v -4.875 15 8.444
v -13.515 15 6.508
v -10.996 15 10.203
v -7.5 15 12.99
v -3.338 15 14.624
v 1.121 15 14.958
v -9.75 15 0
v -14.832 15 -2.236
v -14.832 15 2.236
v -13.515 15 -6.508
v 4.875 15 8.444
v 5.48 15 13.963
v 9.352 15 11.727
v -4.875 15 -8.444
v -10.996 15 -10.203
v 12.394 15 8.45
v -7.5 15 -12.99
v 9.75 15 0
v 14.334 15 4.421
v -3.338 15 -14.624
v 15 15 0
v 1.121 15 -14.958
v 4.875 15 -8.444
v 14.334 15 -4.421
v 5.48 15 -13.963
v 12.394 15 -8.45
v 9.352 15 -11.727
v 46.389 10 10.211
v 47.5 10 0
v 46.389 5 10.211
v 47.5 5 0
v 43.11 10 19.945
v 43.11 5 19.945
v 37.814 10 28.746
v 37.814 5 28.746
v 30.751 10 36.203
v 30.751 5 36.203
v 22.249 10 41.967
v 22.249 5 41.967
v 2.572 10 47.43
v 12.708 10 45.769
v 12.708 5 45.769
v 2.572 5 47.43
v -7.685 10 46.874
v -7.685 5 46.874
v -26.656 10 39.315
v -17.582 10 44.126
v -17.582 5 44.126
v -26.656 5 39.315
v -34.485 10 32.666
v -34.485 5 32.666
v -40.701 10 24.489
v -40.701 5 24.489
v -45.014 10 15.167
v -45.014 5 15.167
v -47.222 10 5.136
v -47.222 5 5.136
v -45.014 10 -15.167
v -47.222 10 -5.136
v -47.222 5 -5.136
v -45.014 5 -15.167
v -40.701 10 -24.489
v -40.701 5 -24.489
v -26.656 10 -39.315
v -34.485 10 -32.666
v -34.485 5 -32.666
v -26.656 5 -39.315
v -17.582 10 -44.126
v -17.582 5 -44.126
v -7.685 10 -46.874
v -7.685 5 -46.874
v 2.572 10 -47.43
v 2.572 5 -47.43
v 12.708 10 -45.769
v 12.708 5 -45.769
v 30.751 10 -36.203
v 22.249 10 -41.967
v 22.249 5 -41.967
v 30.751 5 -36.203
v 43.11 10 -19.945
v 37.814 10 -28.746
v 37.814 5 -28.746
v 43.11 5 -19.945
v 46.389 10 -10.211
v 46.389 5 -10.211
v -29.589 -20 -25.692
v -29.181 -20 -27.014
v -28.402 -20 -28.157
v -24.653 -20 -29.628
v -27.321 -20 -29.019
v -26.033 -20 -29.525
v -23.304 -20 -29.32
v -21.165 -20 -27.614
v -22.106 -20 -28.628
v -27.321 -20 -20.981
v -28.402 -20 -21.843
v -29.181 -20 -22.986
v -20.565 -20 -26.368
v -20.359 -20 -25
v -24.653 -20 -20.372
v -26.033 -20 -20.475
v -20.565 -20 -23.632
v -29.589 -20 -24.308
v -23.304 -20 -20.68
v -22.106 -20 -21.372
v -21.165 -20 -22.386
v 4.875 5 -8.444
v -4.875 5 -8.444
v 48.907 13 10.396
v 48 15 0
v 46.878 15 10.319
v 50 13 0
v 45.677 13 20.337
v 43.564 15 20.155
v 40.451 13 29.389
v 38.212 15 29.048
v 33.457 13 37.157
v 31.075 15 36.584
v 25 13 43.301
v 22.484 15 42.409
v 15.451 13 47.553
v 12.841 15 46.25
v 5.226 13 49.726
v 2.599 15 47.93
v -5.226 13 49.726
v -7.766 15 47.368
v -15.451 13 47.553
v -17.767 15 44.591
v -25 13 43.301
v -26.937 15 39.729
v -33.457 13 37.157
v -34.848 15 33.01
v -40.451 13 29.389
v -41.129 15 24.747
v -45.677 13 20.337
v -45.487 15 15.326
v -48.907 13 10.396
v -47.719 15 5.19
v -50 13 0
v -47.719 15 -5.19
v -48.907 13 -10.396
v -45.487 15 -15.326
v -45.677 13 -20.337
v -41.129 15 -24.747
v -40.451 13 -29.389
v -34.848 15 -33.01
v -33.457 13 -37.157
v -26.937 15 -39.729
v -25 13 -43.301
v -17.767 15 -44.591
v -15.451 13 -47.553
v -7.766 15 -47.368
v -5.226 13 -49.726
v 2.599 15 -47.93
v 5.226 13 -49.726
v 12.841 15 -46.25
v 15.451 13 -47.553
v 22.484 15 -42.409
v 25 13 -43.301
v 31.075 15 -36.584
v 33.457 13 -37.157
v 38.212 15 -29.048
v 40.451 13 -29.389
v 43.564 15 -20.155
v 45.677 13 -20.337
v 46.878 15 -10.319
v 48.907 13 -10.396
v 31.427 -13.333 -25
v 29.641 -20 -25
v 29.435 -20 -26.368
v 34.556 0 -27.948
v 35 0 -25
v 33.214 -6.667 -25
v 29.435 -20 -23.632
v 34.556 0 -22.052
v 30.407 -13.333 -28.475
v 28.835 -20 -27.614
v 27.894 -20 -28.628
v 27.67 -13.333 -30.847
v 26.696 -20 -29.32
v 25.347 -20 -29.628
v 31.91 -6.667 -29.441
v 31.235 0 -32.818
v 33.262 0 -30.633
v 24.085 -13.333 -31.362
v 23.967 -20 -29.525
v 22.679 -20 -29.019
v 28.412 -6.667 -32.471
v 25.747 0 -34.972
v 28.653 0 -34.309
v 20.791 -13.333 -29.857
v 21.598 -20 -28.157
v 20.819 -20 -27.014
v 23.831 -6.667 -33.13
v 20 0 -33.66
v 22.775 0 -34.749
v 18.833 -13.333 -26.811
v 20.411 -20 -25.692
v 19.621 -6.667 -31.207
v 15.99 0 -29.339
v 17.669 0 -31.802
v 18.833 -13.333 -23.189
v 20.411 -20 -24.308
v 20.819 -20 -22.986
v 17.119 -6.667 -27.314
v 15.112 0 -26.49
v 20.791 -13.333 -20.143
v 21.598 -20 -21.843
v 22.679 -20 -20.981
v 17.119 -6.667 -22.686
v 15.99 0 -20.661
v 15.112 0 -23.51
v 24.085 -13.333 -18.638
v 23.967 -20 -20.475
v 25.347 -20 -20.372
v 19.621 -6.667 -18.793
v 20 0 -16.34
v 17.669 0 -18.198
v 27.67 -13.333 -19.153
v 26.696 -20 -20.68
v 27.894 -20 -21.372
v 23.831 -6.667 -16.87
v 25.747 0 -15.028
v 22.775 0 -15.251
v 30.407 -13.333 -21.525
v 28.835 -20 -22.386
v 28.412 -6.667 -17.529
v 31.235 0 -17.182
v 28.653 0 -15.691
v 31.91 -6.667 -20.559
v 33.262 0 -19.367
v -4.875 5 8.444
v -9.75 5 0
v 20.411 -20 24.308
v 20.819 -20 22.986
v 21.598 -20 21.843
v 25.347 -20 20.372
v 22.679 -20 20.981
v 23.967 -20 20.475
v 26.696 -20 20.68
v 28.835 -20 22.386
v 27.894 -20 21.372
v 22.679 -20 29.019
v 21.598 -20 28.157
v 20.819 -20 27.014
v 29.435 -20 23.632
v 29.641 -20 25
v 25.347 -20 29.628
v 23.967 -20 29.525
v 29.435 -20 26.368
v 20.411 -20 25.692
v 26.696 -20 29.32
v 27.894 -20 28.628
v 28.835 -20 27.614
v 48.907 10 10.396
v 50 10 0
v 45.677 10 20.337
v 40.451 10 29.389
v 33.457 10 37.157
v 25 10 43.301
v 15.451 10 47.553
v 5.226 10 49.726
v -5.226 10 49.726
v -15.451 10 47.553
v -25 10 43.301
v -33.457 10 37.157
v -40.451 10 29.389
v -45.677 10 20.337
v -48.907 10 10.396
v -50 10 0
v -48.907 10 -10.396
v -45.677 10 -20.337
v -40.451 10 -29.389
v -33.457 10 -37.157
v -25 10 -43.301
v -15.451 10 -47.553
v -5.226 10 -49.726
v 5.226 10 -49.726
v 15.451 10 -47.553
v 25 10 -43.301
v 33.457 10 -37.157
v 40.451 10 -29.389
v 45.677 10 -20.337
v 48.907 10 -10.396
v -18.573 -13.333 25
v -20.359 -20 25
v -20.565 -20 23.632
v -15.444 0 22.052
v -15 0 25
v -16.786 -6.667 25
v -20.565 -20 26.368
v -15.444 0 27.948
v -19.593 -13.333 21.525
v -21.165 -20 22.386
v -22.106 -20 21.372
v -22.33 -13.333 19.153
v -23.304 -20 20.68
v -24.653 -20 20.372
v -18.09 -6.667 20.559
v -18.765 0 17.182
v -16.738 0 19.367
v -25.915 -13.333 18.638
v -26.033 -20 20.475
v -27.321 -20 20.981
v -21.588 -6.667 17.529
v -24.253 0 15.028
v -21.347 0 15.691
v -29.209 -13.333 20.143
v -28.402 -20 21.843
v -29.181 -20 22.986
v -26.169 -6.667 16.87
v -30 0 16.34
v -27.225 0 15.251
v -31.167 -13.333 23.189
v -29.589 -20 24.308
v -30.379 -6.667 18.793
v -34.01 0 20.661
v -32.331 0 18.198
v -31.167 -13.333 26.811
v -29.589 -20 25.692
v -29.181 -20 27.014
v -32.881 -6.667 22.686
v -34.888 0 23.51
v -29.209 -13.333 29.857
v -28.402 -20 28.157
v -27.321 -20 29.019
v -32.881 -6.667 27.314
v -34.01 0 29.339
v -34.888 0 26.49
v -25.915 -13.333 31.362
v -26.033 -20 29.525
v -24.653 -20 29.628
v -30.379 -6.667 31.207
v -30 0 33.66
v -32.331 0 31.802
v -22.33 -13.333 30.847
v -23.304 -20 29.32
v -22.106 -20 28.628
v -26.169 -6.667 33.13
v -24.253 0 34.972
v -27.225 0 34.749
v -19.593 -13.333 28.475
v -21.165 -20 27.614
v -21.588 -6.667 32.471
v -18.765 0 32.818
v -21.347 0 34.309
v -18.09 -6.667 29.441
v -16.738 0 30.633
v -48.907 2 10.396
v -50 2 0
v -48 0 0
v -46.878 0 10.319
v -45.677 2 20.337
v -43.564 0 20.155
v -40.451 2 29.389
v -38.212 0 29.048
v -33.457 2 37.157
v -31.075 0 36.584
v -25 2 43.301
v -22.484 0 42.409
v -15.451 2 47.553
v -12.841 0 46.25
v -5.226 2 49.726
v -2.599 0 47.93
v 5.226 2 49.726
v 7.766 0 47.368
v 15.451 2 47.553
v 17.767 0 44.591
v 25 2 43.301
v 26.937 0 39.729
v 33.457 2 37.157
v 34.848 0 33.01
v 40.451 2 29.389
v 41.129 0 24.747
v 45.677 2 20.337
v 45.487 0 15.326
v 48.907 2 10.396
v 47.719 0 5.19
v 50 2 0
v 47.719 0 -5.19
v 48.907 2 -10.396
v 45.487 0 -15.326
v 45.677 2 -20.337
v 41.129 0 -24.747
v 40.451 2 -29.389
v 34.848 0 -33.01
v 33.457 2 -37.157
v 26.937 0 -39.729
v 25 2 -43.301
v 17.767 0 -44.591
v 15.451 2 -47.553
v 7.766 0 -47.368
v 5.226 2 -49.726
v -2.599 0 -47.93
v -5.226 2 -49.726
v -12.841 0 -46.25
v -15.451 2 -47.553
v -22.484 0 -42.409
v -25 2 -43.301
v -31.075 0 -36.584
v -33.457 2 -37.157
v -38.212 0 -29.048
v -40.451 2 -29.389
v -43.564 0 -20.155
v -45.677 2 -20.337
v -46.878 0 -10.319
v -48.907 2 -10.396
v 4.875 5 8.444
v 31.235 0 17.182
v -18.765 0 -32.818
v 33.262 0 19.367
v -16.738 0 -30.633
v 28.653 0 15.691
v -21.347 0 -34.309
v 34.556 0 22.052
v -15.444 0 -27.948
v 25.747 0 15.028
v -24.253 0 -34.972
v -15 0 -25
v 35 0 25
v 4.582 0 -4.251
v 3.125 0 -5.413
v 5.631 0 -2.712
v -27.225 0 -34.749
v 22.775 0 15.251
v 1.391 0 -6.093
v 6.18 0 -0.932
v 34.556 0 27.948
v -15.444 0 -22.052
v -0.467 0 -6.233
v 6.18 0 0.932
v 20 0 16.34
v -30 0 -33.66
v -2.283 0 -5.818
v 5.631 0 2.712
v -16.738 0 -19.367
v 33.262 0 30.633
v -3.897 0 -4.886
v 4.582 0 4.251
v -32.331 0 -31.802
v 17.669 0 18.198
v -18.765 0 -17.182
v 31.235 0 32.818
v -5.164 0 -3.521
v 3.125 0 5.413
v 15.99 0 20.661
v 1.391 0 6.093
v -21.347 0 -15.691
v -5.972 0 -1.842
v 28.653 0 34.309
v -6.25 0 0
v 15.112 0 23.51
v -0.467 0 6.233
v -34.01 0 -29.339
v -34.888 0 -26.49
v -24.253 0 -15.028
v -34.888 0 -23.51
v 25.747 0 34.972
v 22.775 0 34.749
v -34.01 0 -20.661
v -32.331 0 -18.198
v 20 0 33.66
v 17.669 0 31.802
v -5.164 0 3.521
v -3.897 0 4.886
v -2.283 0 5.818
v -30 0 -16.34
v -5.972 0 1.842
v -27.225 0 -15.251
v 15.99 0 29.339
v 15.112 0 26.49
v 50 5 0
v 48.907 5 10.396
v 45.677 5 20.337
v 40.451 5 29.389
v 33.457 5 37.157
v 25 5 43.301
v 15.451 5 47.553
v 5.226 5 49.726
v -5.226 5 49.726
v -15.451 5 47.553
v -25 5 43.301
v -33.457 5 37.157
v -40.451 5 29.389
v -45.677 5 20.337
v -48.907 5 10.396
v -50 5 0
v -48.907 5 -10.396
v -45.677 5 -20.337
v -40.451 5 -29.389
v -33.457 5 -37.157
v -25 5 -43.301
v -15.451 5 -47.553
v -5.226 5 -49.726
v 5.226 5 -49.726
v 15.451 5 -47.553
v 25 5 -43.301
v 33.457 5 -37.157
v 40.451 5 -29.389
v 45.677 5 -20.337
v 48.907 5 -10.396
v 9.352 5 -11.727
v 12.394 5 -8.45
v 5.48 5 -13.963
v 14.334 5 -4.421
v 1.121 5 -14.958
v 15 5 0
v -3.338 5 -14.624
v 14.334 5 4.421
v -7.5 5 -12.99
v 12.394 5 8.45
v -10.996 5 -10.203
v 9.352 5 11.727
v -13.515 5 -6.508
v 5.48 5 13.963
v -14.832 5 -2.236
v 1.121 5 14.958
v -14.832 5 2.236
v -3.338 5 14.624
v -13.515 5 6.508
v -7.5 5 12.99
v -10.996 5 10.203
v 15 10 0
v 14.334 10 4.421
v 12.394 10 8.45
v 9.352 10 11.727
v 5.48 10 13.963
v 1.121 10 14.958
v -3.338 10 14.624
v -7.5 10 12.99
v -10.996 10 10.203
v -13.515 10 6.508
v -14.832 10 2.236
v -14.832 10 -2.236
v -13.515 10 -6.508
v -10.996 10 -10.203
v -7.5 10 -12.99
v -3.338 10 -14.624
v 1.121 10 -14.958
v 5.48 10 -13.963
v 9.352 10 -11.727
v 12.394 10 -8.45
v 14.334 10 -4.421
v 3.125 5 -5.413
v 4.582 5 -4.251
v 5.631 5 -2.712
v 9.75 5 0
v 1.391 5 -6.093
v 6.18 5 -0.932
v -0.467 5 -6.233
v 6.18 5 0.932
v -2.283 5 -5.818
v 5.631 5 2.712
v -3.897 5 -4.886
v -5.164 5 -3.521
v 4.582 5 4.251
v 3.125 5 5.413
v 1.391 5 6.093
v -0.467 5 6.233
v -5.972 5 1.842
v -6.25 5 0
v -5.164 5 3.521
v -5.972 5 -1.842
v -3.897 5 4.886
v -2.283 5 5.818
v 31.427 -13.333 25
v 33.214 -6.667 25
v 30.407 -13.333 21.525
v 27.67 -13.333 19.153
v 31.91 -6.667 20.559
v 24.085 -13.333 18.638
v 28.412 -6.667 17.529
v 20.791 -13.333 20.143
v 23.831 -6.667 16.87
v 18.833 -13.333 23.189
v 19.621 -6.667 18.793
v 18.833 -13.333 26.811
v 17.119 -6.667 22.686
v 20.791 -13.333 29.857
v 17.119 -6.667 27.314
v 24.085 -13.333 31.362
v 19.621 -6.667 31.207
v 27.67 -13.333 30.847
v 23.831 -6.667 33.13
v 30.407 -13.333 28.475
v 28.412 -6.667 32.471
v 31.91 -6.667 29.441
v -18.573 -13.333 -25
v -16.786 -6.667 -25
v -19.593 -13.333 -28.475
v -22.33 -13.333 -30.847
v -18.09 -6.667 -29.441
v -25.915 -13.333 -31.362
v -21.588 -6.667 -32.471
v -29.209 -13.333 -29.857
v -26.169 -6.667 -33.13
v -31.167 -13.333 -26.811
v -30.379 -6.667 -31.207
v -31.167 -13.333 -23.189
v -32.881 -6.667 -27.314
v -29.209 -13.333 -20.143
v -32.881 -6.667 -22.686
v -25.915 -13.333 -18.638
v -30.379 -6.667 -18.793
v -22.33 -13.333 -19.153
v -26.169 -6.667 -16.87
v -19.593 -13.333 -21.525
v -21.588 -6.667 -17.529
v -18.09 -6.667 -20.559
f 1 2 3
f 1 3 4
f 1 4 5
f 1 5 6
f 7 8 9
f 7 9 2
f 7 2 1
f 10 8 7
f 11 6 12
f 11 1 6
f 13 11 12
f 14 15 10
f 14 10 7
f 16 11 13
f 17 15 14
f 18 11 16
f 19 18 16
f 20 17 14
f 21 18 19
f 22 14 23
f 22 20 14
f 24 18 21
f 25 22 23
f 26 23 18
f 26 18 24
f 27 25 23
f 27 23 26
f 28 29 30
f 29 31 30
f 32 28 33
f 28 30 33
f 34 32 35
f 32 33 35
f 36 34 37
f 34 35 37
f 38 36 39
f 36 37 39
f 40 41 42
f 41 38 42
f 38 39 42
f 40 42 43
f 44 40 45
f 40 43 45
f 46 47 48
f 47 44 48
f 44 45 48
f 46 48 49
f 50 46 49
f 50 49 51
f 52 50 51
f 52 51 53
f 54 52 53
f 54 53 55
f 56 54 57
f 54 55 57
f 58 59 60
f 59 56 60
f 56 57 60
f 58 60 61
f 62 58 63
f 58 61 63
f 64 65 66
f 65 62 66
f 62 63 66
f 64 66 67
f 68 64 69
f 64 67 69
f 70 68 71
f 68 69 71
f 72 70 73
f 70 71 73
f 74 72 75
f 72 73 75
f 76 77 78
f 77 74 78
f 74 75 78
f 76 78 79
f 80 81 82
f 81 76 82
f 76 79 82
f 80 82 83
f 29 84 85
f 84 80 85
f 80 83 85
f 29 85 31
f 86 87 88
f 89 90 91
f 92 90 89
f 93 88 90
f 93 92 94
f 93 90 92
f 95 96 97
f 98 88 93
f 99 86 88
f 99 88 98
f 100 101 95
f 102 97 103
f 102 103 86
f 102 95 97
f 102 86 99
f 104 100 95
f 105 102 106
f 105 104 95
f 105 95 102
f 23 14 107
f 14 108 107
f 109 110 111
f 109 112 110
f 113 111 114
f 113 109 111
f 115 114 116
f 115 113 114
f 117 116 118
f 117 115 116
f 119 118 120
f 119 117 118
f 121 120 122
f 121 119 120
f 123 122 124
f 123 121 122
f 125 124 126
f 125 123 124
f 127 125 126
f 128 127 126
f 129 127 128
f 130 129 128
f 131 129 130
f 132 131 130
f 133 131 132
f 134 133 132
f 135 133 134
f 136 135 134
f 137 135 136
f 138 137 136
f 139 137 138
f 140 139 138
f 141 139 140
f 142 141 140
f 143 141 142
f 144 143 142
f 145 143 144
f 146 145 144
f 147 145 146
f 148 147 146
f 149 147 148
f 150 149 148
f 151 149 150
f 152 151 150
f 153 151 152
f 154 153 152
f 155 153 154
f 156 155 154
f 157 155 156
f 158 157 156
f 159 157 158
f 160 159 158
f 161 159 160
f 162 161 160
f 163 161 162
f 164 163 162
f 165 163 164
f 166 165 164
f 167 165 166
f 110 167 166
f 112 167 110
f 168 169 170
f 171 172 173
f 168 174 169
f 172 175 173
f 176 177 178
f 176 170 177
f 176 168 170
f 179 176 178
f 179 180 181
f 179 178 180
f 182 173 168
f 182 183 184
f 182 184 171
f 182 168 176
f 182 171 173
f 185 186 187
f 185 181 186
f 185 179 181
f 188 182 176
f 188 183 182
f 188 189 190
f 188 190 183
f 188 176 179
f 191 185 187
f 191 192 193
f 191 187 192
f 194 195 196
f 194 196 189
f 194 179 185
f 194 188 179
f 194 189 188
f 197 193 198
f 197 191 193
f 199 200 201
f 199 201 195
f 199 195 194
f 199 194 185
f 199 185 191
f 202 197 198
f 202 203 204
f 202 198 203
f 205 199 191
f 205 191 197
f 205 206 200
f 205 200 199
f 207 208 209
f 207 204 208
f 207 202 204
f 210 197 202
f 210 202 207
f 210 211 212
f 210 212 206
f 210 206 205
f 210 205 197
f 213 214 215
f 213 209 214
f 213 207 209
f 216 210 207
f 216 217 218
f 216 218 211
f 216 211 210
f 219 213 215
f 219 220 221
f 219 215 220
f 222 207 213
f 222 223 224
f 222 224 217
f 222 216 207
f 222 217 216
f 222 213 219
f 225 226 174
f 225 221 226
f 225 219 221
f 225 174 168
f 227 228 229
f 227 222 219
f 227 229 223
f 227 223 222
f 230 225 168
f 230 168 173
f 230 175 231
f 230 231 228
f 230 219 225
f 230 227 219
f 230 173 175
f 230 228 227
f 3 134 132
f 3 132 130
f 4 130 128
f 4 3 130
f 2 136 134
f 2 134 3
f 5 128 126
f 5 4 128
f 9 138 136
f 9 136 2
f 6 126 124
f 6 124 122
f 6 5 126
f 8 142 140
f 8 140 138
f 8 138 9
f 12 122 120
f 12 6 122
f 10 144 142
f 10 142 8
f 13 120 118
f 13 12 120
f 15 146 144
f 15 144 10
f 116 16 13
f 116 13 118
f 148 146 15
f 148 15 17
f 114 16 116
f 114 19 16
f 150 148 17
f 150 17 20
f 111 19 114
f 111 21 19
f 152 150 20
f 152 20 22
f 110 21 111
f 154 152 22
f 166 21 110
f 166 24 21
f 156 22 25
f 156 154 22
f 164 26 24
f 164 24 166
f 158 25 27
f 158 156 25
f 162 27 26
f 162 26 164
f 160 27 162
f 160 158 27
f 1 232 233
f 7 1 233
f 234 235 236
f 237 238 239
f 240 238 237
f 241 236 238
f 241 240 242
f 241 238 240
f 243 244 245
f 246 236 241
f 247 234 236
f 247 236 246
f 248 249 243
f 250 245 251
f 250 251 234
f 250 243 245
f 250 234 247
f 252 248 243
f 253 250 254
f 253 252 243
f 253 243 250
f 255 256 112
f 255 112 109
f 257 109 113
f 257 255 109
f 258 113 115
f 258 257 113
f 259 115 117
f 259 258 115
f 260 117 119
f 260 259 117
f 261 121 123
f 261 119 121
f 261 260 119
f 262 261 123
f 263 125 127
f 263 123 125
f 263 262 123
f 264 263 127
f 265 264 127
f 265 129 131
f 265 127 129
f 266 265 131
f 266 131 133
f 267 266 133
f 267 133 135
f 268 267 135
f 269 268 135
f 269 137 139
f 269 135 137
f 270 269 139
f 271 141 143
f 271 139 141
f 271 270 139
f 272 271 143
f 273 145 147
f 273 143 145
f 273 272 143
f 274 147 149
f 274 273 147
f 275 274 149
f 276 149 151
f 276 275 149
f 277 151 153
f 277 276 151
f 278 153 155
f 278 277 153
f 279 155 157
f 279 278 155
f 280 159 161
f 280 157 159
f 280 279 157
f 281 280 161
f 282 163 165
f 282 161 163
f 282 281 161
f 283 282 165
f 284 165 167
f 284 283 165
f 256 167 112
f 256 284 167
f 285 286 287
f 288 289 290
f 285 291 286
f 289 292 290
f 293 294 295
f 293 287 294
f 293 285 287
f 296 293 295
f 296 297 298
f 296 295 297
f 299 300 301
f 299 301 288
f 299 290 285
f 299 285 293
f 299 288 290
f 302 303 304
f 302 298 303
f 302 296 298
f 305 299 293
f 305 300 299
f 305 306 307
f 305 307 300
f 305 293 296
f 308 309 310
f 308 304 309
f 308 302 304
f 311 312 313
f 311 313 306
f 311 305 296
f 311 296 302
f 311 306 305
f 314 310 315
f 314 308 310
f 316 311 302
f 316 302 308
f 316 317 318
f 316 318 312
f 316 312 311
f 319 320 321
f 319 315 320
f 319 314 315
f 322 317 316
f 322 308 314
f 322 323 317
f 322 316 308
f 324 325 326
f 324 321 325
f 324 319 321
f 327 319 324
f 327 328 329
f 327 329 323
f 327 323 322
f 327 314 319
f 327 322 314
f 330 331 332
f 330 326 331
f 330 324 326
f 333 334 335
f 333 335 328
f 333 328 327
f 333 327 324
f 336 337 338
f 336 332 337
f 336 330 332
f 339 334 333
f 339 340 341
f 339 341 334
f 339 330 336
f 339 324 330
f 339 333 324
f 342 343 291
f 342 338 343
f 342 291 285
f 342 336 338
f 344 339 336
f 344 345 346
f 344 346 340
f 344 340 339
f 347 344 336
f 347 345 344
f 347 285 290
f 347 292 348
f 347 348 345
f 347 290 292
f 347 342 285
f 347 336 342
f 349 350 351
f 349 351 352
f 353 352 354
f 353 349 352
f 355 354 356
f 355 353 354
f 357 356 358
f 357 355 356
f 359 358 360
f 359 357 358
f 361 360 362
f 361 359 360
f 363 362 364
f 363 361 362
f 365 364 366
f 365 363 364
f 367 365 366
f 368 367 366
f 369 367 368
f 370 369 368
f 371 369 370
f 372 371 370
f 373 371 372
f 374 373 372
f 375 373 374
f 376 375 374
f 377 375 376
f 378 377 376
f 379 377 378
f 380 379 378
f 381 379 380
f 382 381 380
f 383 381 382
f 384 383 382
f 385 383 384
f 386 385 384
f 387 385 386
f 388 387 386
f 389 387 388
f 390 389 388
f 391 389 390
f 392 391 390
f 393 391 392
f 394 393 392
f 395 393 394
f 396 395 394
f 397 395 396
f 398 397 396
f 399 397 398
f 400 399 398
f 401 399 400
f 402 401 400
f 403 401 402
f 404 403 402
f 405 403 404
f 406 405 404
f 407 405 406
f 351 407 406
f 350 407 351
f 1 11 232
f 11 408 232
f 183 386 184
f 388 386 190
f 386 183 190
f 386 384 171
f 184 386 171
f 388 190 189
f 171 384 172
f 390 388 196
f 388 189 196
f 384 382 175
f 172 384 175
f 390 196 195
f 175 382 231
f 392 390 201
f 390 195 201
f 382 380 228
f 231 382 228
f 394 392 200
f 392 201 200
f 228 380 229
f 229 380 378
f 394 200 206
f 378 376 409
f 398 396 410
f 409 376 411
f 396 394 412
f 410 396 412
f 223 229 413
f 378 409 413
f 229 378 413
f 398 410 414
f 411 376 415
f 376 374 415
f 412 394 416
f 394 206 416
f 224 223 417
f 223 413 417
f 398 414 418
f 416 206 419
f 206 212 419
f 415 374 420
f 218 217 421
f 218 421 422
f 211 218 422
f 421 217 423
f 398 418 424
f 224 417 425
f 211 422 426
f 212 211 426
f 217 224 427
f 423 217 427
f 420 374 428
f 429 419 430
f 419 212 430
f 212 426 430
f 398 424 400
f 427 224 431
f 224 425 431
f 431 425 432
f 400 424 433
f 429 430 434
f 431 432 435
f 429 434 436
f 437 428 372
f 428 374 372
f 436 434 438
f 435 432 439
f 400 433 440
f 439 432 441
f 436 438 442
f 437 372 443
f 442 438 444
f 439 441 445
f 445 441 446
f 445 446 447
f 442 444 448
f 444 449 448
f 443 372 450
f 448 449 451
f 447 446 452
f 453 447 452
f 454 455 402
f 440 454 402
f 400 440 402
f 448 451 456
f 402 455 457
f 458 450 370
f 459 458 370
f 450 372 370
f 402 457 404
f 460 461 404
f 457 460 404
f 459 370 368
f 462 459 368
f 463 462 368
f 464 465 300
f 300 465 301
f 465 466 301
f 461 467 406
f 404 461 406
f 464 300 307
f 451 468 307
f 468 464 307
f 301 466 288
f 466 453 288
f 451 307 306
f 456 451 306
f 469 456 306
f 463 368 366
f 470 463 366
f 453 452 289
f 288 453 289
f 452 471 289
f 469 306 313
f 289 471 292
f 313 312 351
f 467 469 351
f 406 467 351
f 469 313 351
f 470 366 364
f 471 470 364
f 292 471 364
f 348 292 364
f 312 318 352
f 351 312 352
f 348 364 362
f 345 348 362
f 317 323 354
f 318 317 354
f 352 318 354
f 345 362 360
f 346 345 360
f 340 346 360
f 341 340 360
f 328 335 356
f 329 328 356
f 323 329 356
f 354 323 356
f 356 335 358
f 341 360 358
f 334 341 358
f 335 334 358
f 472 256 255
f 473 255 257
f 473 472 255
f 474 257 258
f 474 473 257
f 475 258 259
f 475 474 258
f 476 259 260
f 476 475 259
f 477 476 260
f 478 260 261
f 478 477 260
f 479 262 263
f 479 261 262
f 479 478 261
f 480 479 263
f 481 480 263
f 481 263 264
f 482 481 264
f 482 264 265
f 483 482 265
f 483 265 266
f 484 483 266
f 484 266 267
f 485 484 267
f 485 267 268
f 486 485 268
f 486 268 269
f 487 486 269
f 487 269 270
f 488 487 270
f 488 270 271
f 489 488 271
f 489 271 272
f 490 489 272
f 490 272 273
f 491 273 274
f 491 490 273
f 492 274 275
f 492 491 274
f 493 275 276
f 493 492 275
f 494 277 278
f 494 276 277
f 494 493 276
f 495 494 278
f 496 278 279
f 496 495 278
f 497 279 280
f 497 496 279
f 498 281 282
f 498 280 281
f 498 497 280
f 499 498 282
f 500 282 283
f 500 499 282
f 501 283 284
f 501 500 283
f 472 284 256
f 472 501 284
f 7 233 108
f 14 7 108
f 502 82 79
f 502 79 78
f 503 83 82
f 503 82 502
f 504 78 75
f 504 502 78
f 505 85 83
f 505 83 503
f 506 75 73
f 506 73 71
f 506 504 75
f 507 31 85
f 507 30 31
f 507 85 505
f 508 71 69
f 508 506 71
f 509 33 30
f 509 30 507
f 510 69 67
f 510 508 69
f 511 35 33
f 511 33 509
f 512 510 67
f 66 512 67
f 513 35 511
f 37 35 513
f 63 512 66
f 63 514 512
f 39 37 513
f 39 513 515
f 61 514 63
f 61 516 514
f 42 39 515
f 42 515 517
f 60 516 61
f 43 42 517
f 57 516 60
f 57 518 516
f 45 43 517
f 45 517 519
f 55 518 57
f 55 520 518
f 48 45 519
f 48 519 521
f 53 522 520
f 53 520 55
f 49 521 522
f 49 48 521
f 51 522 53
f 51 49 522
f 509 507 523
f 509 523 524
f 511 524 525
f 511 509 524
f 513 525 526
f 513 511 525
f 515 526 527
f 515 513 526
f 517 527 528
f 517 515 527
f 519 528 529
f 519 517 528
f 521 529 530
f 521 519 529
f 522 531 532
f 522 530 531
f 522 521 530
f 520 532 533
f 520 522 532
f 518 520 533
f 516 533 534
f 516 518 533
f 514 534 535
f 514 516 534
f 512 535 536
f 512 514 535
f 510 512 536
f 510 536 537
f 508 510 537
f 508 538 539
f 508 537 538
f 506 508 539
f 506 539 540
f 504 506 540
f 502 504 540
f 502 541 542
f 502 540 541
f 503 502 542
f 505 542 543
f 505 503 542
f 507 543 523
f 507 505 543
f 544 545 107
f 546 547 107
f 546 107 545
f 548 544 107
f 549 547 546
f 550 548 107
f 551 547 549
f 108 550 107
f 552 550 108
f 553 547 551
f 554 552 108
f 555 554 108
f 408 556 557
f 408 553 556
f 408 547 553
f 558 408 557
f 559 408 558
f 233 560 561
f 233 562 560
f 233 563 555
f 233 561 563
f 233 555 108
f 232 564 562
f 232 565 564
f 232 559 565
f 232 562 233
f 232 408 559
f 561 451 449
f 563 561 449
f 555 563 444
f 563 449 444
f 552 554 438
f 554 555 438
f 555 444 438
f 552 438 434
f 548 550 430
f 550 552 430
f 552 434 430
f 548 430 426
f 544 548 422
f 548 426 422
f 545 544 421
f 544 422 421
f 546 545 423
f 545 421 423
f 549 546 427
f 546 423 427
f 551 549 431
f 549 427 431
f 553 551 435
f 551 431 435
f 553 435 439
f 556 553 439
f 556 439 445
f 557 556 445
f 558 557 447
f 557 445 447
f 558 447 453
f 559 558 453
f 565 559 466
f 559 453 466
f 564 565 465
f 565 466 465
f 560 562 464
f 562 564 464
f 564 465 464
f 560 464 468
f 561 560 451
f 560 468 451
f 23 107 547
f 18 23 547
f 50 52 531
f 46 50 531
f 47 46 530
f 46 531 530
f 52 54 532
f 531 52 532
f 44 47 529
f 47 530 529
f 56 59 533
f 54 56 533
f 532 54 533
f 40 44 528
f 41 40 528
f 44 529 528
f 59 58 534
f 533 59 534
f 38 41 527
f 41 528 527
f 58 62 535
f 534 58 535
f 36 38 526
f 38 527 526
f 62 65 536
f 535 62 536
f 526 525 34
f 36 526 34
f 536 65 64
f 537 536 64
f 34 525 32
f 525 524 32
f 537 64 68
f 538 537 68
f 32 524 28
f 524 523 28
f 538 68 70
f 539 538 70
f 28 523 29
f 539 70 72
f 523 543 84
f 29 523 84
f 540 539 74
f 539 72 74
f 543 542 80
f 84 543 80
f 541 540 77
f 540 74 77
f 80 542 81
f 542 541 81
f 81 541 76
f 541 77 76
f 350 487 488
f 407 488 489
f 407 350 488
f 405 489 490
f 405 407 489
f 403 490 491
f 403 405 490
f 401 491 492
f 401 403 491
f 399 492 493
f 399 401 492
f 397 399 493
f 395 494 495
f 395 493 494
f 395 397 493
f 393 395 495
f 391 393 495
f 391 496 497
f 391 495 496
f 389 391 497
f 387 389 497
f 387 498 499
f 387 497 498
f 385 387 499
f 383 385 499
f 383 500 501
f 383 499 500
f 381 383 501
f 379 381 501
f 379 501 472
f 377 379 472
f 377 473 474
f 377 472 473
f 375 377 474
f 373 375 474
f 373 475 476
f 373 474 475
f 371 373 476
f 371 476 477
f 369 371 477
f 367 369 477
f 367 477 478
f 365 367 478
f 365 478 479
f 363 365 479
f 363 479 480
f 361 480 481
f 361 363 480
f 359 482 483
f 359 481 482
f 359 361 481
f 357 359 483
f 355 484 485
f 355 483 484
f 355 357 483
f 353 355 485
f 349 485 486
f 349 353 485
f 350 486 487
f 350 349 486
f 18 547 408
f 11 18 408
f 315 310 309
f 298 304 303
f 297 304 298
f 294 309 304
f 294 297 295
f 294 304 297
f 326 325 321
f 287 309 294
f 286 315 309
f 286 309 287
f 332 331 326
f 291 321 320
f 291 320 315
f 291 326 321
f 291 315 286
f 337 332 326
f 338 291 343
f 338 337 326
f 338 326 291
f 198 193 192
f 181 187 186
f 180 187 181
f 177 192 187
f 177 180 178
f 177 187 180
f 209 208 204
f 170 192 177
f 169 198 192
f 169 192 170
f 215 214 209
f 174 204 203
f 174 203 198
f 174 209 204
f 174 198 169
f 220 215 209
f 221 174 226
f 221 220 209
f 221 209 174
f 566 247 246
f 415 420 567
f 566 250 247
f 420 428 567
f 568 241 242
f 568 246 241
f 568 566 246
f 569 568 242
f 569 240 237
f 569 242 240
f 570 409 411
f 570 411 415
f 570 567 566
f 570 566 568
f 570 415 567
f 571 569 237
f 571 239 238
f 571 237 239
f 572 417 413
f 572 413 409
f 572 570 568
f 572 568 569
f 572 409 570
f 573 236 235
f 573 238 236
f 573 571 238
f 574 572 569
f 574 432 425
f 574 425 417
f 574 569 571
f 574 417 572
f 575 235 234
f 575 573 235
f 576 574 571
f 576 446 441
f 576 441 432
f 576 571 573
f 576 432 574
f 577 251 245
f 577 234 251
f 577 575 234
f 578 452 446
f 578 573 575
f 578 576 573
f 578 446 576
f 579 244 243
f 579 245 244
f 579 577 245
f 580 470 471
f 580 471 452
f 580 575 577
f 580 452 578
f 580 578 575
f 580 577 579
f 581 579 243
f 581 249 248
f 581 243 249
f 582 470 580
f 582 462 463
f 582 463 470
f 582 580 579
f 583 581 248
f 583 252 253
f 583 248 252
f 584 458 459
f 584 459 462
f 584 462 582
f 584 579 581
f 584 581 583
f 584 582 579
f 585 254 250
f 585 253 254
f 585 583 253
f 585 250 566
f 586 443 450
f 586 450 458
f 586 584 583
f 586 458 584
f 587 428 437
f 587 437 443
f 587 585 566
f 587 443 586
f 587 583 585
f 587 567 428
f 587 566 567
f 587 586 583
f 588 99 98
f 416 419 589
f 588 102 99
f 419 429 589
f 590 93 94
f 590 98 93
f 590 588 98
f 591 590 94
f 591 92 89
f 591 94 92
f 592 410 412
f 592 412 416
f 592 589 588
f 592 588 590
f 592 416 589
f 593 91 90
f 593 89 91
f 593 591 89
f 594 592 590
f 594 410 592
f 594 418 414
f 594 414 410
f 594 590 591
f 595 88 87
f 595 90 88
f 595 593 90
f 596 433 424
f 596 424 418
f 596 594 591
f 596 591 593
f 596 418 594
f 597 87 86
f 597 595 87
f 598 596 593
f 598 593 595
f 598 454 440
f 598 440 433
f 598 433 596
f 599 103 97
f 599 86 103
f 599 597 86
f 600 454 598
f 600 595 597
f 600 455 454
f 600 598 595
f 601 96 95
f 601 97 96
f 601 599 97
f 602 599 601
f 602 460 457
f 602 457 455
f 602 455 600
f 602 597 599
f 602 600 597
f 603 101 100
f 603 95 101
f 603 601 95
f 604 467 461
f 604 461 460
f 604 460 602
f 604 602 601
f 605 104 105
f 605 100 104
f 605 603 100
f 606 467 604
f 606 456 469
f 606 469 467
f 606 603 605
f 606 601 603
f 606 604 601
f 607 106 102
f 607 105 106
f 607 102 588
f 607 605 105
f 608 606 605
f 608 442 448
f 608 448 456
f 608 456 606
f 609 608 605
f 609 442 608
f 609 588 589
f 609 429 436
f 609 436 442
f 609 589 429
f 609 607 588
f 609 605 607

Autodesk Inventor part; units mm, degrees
ref_plane "YZ Plane" through (0, 0, 0) normal (1, 0, 0) x (0, 1, 0)
ref_plane "XZ Plane" through (0, 0, 0) normal (0, 1, 0) x (-1, 0, 0)
ref_plane "XY Plane" through (0, 0, 0) normal (0, 0, 1) x (1, 0, 0)
sketch "Sketch1" plane through (0, 0, 0) normal (0, 1, 0) x (-1, 0, 0)
  circle A0 centre (0, 0) radius 50
  circle A1 centre (0, 0) radius 6.25
  dimension "d0" = 100
  dimension "d1" = 12.5
extrude "Extrusion1" add sketch "Sketch1" along normal blind 5
sketch "Sketch2" plane through (0, 5, 0) normal (0, 1, 0) x (1, 0, 0)
  line L0 (9.75, 0) -> (4.875, -8.4437)
  line L1 (4.875, -8.4437) -> (-4.875, -8.4437)
  line L2 (-4.875, -8.4437) -> (-9.75, 0)
  line L3 (-9.75, 0) -> (-4.875, 8.4437)
  line L4 (-4.875, 8.4437) -> (4.875, 8.4437)
  line L5 (4.875, 8.4437) -> (9.75, 0)
  line L6 (0, 0) -> (0, 50) construction
  circle A0 centre (0, 0) radius 50 construction
  line L7 (0, 0) -> (-50, 0) construction
  circle A1 centre (0, 0) radius 15
  dimension "d4" = 19.5
  dimension "d5" = 30
extrude "Extrusion2" add sketch "Sketch2" along normal blind 10
sketch "Sketch3" plane through (0, 5, 0) normal (0, 1, 0) x (1, 0, 0)
  circle A0 centre (0, 0) radius 50
  circle A1 centre (0, 0) radius 47.5
  dimension "d8" = 95
extrude "Extrusion3" add sketch "Sketch3" along normal blind 5
sketch "Sketch4" plane through (0, 10, 0) normal (0, 1, 0) x (1, 0, 0)
  circle A0 centre (0, 0) radius 15
  circle A1 centre (0, 0) radius 50
extrude "Extrusion4" add sketch "Sketch4" along normal blind 5
sketch "Sketch5" plane through (0, 0, 0) normal (0, -1, 0) x (1, 0, 0)
  circle A0 centre (0, 0) radius 6.25 construction
  line L0 (0, 0) -> (0, -50) construction
  circle A1 centre (0, 0) radius 50 construction
  line L1 (0, 0) -> (50, 0) construction
  circle A2 centre (25, -25) radius 10
  circle A3 centre (-25, -25) radius 10
  circle A4 centre (25, 25) radius 10
  circle A5 centre (-25, 25) radius 10
  dimension "d13" = 20
  dimension "d14" = 25
  dimension "d15" = 25
extrude "Extrusion5" add sketch "Sketch5" along normal blind 20
draft "FaceDraft1" angle 15 pull direction (0, -1, 0) faces at (34.8705, -13.3333, -26.6041) fixed edges at (15, 0, -25)
draft "FaceDraft3" angle 15 pull direction (0, -1, 0) faces at (-15.1295, -13.3333, -26.6041) fixed edges at (-35, 0, -25)
draft "FaceDraft4" angle 15 pull direction (0, -1, 0) faces at (34.8705, -13.3333, 23.3959) fixed edges at (15, 0, 25)
draft "FaceDraft5" angle 15 pull direction (0, -1, 0) faces at (-15.1295, -13.3333, 23.3959) fixed edges at (-35, 0, 25)
chamfer "Chamfer1" distance 2 angle 45 1 edges at (-50, 15, 0)
chamfer "Chamfer2" distance 2 angle 45 1 edges at (50, 0, 0)
properties part number "ground_support_2"
